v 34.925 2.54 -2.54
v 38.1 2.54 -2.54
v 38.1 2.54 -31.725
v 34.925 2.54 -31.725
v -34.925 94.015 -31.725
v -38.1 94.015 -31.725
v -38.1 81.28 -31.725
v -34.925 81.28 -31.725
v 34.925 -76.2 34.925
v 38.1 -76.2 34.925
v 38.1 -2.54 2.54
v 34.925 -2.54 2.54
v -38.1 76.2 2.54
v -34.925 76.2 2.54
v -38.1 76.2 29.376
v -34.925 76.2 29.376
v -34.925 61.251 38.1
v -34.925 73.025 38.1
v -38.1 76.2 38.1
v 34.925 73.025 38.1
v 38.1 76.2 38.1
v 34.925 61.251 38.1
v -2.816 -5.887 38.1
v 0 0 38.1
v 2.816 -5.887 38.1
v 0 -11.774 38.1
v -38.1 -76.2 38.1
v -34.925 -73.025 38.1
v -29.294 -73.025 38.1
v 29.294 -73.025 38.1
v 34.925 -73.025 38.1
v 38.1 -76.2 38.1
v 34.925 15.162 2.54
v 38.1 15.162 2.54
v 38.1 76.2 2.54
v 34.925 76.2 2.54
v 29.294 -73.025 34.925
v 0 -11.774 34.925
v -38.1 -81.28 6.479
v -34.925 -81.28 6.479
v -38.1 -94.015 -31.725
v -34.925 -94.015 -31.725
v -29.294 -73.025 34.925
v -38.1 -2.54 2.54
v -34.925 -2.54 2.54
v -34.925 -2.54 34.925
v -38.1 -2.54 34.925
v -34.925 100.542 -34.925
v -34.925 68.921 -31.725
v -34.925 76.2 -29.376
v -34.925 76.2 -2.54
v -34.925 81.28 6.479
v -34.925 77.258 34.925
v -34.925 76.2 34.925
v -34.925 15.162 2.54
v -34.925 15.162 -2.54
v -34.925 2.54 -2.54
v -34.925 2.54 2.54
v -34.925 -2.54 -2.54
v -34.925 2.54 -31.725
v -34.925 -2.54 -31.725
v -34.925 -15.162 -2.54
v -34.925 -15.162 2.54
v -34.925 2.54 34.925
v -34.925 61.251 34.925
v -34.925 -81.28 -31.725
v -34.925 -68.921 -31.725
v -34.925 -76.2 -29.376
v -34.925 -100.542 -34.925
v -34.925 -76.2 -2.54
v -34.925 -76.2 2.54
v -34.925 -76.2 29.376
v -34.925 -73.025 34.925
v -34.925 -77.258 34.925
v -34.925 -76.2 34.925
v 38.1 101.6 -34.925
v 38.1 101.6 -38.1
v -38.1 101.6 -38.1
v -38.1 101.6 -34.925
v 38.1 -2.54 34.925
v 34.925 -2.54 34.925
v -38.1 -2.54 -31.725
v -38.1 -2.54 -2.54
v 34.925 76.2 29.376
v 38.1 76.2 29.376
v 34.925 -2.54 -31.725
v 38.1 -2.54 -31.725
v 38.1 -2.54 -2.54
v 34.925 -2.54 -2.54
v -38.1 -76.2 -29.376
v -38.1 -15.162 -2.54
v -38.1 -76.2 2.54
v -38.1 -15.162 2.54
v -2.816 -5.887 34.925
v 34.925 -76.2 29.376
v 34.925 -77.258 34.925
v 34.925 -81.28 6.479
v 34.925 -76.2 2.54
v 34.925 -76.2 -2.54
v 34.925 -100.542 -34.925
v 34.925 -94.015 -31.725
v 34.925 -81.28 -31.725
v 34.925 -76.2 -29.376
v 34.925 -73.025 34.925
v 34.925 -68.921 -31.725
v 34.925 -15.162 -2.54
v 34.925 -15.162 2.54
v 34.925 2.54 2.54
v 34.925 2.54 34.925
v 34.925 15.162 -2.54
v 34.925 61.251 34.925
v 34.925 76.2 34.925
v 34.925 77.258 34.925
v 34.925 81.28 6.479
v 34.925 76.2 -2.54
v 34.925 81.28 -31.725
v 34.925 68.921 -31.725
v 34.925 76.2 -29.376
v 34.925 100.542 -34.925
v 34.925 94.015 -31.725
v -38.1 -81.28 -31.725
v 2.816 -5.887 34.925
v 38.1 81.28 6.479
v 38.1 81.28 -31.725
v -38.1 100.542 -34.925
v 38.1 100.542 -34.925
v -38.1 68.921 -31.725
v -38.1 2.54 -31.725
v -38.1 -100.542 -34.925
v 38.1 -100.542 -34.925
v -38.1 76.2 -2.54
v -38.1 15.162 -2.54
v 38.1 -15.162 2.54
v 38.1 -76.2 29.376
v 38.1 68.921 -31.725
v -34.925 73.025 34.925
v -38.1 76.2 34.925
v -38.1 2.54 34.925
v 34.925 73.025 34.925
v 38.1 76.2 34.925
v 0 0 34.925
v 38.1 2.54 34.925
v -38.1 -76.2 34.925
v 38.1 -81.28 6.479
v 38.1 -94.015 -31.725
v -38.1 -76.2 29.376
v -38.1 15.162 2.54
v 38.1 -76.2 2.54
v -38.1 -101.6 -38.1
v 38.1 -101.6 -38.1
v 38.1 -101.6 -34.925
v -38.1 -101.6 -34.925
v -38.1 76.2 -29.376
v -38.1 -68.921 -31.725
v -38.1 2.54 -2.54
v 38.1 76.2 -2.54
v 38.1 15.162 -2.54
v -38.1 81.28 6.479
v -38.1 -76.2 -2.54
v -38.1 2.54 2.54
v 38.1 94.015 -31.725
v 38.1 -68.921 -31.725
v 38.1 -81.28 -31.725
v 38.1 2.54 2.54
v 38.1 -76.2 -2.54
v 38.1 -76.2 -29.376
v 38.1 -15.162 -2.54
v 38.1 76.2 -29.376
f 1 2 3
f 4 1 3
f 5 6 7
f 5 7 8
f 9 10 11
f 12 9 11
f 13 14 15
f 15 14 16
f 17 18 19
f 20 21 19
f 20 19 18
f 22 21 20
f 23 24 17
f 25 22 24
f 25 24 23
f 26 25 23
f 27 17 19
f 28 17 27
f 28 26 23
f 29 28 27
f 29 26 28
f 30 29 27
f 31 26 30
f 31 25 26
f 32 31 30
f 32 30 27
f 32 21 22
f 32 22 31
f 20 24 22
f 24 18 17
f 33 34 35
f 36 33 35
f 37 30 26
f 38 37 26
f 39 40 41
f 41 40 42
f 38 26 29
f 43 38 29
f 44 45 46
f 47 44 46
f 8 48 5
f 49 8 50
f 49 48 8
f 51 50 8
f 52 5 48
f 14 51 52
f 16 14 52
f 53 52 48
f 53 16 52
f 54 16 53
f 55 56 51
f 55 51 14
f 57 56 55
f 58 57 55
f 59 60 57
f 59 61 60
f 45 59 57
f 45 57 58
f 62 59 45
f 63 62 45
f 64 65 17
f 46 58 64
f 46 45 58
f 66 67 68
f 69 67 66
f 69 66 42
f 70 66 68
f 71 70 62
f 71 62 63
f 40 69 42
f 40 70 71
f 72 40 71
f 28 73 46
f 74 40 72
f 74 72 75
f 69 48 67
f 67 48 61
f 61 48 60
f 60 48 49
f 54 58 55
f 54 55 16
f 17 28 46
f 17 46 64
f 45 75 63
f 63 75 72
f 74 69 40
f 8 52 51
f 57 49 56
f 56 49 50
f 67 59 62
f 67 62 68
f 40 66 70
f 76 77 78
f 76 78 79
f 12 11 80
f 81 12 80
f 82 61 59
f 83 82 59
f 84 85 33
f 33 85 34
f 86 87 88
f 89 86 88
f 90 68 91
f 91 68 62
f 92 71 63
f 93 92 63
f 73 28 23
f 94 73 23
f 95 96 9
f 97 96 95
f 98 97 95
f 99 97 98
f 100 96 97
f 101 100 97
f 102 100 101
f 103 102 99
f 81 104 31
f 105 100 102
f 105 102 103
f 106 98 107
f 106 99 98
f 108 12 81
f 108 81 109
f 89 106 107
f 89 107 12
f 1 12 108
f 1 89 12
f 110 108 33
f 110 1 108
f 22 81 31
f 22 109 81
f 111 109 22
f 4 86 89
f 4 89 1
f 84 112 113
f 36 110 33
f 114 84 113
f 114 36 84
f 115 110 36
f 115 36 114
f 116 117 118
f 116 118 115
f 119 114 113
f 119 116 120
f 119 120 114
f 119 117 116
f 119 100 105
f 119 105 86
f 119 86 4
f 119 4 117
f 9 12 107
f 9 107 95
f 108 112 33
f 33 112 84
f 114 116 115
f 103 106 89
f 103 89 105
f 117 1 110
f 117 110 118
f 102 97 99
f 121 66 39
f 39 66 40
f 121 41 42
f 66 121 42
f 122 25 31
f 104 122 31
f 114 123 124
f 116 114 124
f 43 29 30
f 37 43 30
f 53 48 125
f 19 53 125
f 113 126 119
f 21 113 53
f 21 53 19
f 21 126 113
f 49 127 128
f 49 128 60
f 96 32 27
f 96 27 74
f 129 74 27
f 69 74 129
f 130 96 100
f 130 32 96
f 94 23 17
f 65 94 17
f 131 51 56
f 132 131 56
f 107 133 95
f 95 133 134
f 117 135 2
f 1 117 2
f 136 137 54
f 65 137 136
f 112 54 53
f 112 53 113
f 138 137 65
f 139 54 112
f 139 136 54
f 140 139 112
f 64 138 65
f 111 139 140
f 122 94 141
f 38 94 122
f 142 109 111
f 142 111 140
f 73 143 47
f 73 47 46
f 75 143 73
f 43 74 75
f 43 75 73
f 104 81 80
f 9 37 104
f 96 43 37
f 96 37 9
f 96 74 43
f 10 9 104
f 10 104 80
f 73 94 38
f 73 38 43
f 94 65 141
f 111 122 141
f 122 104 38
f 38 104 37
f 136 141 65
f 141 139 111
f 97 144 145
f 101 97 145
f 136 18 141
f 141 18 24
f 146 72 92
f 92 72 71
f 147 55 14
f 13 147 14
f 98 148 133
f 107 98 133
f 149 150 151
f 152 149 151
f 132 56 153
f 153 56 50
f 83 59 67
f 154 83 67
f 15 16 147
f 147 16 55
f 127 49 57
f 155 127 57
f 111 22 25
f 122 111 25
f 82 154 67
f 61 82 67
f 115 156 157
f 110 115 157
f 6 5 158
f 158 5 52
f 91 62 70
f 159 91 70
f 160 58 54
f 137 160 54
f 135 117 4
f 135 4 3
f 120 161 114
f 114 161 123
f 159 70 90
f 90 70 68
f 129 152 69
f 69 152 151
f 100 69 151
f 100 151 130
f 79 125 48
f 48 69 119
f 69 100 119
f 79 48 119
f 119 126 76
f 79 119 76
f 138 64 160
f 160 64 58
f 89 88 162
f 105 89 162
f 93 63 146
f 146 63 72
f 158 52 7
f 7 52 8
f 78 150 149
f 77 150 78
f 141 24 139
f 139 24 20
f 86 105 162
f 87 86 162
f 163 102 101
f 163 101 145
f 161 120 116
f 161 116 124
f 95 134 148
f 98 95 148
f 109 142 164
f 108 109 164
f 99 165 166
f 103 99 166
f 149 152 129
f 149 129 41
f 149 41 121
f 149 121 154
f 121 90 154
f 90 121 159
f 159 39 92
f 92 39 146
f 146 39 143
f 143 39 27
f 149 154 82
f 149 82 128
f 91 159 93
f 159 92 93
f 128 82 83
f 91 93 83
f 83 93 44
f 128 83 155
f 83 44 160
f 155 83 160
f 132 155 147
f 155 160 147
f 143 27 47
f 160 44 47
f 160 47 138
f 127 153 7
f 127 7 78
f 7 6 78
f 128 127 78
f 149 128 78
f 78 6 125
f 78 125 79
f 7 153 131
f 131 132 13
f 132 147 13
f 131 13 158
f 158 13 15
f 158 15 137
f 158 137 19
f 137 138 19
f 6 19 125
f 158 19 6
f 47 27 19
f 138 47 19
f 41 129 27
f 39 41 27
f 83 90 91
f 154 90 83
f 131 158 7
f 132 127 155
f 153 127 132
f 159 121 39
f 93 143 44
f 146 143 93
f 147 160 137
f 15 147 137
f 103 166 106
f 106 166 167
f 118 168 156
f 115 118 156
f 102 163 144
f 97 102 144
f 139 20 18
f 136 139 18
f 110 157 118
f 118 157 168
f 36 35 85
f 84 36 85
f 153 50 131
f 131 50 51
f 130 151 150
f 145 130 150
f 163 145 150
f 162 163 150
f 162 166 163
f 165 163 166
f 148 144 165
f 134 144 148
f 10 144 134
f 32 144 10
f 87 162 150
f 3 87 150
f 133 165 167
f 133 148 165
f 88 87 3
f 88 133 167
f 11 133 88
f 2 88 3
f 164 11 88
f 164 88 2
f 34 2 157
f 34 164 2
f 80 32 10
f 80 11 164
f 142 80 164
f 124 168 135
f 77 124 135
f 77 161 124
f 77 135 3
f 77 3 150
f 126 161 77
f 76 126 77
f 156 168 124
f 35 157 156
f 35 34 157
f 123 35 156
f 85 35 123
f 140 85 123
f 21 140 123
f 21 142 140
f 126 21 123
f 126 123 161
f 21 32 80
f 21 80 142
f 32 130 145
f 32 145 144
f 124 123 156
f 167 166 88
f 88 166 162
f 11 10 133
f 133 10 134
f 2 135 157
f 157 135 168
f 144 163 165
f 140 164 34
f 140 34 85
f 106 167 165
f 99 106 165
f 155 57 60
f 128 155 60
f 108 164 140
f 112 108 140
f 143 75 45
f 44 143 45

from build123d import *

# Parameters (mm, degrees)
F1_DEPTH  = 38.1
F3_W      = 69.85
F3_H      = 69.85
F4_DEPTH  = 127
F5_DEPTH  = 76.2
F7_DEPTH  = 3.175
F8_W      = 6.5186821197
F8_H      = 3.175
F9_DEPTH  = 76.2
F10_W     = 3.175
F10_H     = 190.1626357606
F11_DEPTH = 3.175
F12_DEPTH = 3.2004


with BuildPart() as f1:
    # F0 (on Right) → F1 (new body, symmetric)
    with BuildSketch(Plane.YZ):
        Polygon((-76.2, 38.1), (-101.6, -38.1), (101.6, -38.1), (76.2, 38.1), align=None)
    extrude(amount=F1_DEPTH, both=True)

    # F3 (on Front) → F4 (cut, symmetric)
    with BuildSketch(Plane.XZ):
        Rectangle(F3_W, F3_H)
    extrude(amount=F4_DEPTH, both=True, mode=Mode.SUBTRACT)

    # F2 (on face) → F5 (cut)
    with BuildSketch(Plane.YZ.offset(38.1)):
        Polygon((-95.0813178803, -34.925), (-81.28, -34.925), (-81.28, 6.4789536409), align=None)
        Polygon((-76.2, -29.37570354), (-15.1619292031, -2.54), (-76.2, -2.54), align=None)
        Polygon((-76.2, 2.54), (-15.1619292031, 2.54), (-76.2, 29.37570354), align=None)
        Polygon((-76.2, 34.925), (-2.54, 2.54), (-2.54, 34.925), align=None)
        Polygon((2.54, 34.925), (2.54, 2.54), (76.2, 34.925), align=None)
        Polygon((15.1619292031, 2.54), (76.2, 2.54), (76.2, 29.37570354), align=None)
        Polygon((15.1619292031, -2.54), (76.2, -29.37570354), (76.2, -2.54), align=None)
        Polygon((2.54, -34.925), (76.2, -34.925), (2.54, -2.54), align=None)
        Polygon((81.28, 6.4789536409), (81.28, -34.925), (95.0813178803, -34.925), align=None)
        Polygon((-76.2, -34.925), (-2.54, -34.925), (-2.54, -2.54), align=None)
    extrude(amount=-F5_DEPTH, mode=Mode.SUBTRACT)

    # F6 (on face) → F7 (cut)
    with BuildSketch(Plane.XY.offset(38.1)):
        Polygon((0, 0), (34.925, 73.025), (-34.925, 73.025), align=None)
        Polygon((-34.925, 61.2509003959), (-34.925, -73.025), (-2.8155455575, -5.8870498021), align=None)
        Polygon((2.8155455575, -5.8870498021), (34.925, -73.025), (34.925, 61.2509003959), align=None)
        Polygon((-29.293908885, -73.025), (29.293908885, -73.025), (0, -11.7740996041), align=None)
    extrude(amount=-F7_DEPTH, mode=Mode.SUBTRACT)

    # F8 (on face) → F9 (join)
    with BuildSketch(Plane.YZ.offset(38.1)):
        with Locations((-98.3406589402, -36.5125)):
            Rectangle(F8_W, F8_H)
        with Locations((98.3406589402, -36.5125)):
            Rectangle(F8_W, F8_H)
    extrude(amount=-F9_DEPTH)

    # F10 (on face) → F11 (join)
    with BuildSketch(Plane.XY.offset(-34.925)):
        with Locations((36.5125, 0)):
            Rectangle(F10_W, F10_H)
        with Locations((-36.5125, 0)):
            Rectangle(F10_W, F10_H)
    extrude(amount=F11_DEPTH)

    # F10 (on face) → F12 (join)
    with BuildSketch(Plane.XY.offset(-34.925)):
        with Locations((36.5125, 0)):
            Rectangle(F10_W, F10_H)
        with Locations((-36.5125, 0)):
            Rectangle(F10_W, F10_H)
    extrude(amount=F12_DEPTH)


solid = f1.part
